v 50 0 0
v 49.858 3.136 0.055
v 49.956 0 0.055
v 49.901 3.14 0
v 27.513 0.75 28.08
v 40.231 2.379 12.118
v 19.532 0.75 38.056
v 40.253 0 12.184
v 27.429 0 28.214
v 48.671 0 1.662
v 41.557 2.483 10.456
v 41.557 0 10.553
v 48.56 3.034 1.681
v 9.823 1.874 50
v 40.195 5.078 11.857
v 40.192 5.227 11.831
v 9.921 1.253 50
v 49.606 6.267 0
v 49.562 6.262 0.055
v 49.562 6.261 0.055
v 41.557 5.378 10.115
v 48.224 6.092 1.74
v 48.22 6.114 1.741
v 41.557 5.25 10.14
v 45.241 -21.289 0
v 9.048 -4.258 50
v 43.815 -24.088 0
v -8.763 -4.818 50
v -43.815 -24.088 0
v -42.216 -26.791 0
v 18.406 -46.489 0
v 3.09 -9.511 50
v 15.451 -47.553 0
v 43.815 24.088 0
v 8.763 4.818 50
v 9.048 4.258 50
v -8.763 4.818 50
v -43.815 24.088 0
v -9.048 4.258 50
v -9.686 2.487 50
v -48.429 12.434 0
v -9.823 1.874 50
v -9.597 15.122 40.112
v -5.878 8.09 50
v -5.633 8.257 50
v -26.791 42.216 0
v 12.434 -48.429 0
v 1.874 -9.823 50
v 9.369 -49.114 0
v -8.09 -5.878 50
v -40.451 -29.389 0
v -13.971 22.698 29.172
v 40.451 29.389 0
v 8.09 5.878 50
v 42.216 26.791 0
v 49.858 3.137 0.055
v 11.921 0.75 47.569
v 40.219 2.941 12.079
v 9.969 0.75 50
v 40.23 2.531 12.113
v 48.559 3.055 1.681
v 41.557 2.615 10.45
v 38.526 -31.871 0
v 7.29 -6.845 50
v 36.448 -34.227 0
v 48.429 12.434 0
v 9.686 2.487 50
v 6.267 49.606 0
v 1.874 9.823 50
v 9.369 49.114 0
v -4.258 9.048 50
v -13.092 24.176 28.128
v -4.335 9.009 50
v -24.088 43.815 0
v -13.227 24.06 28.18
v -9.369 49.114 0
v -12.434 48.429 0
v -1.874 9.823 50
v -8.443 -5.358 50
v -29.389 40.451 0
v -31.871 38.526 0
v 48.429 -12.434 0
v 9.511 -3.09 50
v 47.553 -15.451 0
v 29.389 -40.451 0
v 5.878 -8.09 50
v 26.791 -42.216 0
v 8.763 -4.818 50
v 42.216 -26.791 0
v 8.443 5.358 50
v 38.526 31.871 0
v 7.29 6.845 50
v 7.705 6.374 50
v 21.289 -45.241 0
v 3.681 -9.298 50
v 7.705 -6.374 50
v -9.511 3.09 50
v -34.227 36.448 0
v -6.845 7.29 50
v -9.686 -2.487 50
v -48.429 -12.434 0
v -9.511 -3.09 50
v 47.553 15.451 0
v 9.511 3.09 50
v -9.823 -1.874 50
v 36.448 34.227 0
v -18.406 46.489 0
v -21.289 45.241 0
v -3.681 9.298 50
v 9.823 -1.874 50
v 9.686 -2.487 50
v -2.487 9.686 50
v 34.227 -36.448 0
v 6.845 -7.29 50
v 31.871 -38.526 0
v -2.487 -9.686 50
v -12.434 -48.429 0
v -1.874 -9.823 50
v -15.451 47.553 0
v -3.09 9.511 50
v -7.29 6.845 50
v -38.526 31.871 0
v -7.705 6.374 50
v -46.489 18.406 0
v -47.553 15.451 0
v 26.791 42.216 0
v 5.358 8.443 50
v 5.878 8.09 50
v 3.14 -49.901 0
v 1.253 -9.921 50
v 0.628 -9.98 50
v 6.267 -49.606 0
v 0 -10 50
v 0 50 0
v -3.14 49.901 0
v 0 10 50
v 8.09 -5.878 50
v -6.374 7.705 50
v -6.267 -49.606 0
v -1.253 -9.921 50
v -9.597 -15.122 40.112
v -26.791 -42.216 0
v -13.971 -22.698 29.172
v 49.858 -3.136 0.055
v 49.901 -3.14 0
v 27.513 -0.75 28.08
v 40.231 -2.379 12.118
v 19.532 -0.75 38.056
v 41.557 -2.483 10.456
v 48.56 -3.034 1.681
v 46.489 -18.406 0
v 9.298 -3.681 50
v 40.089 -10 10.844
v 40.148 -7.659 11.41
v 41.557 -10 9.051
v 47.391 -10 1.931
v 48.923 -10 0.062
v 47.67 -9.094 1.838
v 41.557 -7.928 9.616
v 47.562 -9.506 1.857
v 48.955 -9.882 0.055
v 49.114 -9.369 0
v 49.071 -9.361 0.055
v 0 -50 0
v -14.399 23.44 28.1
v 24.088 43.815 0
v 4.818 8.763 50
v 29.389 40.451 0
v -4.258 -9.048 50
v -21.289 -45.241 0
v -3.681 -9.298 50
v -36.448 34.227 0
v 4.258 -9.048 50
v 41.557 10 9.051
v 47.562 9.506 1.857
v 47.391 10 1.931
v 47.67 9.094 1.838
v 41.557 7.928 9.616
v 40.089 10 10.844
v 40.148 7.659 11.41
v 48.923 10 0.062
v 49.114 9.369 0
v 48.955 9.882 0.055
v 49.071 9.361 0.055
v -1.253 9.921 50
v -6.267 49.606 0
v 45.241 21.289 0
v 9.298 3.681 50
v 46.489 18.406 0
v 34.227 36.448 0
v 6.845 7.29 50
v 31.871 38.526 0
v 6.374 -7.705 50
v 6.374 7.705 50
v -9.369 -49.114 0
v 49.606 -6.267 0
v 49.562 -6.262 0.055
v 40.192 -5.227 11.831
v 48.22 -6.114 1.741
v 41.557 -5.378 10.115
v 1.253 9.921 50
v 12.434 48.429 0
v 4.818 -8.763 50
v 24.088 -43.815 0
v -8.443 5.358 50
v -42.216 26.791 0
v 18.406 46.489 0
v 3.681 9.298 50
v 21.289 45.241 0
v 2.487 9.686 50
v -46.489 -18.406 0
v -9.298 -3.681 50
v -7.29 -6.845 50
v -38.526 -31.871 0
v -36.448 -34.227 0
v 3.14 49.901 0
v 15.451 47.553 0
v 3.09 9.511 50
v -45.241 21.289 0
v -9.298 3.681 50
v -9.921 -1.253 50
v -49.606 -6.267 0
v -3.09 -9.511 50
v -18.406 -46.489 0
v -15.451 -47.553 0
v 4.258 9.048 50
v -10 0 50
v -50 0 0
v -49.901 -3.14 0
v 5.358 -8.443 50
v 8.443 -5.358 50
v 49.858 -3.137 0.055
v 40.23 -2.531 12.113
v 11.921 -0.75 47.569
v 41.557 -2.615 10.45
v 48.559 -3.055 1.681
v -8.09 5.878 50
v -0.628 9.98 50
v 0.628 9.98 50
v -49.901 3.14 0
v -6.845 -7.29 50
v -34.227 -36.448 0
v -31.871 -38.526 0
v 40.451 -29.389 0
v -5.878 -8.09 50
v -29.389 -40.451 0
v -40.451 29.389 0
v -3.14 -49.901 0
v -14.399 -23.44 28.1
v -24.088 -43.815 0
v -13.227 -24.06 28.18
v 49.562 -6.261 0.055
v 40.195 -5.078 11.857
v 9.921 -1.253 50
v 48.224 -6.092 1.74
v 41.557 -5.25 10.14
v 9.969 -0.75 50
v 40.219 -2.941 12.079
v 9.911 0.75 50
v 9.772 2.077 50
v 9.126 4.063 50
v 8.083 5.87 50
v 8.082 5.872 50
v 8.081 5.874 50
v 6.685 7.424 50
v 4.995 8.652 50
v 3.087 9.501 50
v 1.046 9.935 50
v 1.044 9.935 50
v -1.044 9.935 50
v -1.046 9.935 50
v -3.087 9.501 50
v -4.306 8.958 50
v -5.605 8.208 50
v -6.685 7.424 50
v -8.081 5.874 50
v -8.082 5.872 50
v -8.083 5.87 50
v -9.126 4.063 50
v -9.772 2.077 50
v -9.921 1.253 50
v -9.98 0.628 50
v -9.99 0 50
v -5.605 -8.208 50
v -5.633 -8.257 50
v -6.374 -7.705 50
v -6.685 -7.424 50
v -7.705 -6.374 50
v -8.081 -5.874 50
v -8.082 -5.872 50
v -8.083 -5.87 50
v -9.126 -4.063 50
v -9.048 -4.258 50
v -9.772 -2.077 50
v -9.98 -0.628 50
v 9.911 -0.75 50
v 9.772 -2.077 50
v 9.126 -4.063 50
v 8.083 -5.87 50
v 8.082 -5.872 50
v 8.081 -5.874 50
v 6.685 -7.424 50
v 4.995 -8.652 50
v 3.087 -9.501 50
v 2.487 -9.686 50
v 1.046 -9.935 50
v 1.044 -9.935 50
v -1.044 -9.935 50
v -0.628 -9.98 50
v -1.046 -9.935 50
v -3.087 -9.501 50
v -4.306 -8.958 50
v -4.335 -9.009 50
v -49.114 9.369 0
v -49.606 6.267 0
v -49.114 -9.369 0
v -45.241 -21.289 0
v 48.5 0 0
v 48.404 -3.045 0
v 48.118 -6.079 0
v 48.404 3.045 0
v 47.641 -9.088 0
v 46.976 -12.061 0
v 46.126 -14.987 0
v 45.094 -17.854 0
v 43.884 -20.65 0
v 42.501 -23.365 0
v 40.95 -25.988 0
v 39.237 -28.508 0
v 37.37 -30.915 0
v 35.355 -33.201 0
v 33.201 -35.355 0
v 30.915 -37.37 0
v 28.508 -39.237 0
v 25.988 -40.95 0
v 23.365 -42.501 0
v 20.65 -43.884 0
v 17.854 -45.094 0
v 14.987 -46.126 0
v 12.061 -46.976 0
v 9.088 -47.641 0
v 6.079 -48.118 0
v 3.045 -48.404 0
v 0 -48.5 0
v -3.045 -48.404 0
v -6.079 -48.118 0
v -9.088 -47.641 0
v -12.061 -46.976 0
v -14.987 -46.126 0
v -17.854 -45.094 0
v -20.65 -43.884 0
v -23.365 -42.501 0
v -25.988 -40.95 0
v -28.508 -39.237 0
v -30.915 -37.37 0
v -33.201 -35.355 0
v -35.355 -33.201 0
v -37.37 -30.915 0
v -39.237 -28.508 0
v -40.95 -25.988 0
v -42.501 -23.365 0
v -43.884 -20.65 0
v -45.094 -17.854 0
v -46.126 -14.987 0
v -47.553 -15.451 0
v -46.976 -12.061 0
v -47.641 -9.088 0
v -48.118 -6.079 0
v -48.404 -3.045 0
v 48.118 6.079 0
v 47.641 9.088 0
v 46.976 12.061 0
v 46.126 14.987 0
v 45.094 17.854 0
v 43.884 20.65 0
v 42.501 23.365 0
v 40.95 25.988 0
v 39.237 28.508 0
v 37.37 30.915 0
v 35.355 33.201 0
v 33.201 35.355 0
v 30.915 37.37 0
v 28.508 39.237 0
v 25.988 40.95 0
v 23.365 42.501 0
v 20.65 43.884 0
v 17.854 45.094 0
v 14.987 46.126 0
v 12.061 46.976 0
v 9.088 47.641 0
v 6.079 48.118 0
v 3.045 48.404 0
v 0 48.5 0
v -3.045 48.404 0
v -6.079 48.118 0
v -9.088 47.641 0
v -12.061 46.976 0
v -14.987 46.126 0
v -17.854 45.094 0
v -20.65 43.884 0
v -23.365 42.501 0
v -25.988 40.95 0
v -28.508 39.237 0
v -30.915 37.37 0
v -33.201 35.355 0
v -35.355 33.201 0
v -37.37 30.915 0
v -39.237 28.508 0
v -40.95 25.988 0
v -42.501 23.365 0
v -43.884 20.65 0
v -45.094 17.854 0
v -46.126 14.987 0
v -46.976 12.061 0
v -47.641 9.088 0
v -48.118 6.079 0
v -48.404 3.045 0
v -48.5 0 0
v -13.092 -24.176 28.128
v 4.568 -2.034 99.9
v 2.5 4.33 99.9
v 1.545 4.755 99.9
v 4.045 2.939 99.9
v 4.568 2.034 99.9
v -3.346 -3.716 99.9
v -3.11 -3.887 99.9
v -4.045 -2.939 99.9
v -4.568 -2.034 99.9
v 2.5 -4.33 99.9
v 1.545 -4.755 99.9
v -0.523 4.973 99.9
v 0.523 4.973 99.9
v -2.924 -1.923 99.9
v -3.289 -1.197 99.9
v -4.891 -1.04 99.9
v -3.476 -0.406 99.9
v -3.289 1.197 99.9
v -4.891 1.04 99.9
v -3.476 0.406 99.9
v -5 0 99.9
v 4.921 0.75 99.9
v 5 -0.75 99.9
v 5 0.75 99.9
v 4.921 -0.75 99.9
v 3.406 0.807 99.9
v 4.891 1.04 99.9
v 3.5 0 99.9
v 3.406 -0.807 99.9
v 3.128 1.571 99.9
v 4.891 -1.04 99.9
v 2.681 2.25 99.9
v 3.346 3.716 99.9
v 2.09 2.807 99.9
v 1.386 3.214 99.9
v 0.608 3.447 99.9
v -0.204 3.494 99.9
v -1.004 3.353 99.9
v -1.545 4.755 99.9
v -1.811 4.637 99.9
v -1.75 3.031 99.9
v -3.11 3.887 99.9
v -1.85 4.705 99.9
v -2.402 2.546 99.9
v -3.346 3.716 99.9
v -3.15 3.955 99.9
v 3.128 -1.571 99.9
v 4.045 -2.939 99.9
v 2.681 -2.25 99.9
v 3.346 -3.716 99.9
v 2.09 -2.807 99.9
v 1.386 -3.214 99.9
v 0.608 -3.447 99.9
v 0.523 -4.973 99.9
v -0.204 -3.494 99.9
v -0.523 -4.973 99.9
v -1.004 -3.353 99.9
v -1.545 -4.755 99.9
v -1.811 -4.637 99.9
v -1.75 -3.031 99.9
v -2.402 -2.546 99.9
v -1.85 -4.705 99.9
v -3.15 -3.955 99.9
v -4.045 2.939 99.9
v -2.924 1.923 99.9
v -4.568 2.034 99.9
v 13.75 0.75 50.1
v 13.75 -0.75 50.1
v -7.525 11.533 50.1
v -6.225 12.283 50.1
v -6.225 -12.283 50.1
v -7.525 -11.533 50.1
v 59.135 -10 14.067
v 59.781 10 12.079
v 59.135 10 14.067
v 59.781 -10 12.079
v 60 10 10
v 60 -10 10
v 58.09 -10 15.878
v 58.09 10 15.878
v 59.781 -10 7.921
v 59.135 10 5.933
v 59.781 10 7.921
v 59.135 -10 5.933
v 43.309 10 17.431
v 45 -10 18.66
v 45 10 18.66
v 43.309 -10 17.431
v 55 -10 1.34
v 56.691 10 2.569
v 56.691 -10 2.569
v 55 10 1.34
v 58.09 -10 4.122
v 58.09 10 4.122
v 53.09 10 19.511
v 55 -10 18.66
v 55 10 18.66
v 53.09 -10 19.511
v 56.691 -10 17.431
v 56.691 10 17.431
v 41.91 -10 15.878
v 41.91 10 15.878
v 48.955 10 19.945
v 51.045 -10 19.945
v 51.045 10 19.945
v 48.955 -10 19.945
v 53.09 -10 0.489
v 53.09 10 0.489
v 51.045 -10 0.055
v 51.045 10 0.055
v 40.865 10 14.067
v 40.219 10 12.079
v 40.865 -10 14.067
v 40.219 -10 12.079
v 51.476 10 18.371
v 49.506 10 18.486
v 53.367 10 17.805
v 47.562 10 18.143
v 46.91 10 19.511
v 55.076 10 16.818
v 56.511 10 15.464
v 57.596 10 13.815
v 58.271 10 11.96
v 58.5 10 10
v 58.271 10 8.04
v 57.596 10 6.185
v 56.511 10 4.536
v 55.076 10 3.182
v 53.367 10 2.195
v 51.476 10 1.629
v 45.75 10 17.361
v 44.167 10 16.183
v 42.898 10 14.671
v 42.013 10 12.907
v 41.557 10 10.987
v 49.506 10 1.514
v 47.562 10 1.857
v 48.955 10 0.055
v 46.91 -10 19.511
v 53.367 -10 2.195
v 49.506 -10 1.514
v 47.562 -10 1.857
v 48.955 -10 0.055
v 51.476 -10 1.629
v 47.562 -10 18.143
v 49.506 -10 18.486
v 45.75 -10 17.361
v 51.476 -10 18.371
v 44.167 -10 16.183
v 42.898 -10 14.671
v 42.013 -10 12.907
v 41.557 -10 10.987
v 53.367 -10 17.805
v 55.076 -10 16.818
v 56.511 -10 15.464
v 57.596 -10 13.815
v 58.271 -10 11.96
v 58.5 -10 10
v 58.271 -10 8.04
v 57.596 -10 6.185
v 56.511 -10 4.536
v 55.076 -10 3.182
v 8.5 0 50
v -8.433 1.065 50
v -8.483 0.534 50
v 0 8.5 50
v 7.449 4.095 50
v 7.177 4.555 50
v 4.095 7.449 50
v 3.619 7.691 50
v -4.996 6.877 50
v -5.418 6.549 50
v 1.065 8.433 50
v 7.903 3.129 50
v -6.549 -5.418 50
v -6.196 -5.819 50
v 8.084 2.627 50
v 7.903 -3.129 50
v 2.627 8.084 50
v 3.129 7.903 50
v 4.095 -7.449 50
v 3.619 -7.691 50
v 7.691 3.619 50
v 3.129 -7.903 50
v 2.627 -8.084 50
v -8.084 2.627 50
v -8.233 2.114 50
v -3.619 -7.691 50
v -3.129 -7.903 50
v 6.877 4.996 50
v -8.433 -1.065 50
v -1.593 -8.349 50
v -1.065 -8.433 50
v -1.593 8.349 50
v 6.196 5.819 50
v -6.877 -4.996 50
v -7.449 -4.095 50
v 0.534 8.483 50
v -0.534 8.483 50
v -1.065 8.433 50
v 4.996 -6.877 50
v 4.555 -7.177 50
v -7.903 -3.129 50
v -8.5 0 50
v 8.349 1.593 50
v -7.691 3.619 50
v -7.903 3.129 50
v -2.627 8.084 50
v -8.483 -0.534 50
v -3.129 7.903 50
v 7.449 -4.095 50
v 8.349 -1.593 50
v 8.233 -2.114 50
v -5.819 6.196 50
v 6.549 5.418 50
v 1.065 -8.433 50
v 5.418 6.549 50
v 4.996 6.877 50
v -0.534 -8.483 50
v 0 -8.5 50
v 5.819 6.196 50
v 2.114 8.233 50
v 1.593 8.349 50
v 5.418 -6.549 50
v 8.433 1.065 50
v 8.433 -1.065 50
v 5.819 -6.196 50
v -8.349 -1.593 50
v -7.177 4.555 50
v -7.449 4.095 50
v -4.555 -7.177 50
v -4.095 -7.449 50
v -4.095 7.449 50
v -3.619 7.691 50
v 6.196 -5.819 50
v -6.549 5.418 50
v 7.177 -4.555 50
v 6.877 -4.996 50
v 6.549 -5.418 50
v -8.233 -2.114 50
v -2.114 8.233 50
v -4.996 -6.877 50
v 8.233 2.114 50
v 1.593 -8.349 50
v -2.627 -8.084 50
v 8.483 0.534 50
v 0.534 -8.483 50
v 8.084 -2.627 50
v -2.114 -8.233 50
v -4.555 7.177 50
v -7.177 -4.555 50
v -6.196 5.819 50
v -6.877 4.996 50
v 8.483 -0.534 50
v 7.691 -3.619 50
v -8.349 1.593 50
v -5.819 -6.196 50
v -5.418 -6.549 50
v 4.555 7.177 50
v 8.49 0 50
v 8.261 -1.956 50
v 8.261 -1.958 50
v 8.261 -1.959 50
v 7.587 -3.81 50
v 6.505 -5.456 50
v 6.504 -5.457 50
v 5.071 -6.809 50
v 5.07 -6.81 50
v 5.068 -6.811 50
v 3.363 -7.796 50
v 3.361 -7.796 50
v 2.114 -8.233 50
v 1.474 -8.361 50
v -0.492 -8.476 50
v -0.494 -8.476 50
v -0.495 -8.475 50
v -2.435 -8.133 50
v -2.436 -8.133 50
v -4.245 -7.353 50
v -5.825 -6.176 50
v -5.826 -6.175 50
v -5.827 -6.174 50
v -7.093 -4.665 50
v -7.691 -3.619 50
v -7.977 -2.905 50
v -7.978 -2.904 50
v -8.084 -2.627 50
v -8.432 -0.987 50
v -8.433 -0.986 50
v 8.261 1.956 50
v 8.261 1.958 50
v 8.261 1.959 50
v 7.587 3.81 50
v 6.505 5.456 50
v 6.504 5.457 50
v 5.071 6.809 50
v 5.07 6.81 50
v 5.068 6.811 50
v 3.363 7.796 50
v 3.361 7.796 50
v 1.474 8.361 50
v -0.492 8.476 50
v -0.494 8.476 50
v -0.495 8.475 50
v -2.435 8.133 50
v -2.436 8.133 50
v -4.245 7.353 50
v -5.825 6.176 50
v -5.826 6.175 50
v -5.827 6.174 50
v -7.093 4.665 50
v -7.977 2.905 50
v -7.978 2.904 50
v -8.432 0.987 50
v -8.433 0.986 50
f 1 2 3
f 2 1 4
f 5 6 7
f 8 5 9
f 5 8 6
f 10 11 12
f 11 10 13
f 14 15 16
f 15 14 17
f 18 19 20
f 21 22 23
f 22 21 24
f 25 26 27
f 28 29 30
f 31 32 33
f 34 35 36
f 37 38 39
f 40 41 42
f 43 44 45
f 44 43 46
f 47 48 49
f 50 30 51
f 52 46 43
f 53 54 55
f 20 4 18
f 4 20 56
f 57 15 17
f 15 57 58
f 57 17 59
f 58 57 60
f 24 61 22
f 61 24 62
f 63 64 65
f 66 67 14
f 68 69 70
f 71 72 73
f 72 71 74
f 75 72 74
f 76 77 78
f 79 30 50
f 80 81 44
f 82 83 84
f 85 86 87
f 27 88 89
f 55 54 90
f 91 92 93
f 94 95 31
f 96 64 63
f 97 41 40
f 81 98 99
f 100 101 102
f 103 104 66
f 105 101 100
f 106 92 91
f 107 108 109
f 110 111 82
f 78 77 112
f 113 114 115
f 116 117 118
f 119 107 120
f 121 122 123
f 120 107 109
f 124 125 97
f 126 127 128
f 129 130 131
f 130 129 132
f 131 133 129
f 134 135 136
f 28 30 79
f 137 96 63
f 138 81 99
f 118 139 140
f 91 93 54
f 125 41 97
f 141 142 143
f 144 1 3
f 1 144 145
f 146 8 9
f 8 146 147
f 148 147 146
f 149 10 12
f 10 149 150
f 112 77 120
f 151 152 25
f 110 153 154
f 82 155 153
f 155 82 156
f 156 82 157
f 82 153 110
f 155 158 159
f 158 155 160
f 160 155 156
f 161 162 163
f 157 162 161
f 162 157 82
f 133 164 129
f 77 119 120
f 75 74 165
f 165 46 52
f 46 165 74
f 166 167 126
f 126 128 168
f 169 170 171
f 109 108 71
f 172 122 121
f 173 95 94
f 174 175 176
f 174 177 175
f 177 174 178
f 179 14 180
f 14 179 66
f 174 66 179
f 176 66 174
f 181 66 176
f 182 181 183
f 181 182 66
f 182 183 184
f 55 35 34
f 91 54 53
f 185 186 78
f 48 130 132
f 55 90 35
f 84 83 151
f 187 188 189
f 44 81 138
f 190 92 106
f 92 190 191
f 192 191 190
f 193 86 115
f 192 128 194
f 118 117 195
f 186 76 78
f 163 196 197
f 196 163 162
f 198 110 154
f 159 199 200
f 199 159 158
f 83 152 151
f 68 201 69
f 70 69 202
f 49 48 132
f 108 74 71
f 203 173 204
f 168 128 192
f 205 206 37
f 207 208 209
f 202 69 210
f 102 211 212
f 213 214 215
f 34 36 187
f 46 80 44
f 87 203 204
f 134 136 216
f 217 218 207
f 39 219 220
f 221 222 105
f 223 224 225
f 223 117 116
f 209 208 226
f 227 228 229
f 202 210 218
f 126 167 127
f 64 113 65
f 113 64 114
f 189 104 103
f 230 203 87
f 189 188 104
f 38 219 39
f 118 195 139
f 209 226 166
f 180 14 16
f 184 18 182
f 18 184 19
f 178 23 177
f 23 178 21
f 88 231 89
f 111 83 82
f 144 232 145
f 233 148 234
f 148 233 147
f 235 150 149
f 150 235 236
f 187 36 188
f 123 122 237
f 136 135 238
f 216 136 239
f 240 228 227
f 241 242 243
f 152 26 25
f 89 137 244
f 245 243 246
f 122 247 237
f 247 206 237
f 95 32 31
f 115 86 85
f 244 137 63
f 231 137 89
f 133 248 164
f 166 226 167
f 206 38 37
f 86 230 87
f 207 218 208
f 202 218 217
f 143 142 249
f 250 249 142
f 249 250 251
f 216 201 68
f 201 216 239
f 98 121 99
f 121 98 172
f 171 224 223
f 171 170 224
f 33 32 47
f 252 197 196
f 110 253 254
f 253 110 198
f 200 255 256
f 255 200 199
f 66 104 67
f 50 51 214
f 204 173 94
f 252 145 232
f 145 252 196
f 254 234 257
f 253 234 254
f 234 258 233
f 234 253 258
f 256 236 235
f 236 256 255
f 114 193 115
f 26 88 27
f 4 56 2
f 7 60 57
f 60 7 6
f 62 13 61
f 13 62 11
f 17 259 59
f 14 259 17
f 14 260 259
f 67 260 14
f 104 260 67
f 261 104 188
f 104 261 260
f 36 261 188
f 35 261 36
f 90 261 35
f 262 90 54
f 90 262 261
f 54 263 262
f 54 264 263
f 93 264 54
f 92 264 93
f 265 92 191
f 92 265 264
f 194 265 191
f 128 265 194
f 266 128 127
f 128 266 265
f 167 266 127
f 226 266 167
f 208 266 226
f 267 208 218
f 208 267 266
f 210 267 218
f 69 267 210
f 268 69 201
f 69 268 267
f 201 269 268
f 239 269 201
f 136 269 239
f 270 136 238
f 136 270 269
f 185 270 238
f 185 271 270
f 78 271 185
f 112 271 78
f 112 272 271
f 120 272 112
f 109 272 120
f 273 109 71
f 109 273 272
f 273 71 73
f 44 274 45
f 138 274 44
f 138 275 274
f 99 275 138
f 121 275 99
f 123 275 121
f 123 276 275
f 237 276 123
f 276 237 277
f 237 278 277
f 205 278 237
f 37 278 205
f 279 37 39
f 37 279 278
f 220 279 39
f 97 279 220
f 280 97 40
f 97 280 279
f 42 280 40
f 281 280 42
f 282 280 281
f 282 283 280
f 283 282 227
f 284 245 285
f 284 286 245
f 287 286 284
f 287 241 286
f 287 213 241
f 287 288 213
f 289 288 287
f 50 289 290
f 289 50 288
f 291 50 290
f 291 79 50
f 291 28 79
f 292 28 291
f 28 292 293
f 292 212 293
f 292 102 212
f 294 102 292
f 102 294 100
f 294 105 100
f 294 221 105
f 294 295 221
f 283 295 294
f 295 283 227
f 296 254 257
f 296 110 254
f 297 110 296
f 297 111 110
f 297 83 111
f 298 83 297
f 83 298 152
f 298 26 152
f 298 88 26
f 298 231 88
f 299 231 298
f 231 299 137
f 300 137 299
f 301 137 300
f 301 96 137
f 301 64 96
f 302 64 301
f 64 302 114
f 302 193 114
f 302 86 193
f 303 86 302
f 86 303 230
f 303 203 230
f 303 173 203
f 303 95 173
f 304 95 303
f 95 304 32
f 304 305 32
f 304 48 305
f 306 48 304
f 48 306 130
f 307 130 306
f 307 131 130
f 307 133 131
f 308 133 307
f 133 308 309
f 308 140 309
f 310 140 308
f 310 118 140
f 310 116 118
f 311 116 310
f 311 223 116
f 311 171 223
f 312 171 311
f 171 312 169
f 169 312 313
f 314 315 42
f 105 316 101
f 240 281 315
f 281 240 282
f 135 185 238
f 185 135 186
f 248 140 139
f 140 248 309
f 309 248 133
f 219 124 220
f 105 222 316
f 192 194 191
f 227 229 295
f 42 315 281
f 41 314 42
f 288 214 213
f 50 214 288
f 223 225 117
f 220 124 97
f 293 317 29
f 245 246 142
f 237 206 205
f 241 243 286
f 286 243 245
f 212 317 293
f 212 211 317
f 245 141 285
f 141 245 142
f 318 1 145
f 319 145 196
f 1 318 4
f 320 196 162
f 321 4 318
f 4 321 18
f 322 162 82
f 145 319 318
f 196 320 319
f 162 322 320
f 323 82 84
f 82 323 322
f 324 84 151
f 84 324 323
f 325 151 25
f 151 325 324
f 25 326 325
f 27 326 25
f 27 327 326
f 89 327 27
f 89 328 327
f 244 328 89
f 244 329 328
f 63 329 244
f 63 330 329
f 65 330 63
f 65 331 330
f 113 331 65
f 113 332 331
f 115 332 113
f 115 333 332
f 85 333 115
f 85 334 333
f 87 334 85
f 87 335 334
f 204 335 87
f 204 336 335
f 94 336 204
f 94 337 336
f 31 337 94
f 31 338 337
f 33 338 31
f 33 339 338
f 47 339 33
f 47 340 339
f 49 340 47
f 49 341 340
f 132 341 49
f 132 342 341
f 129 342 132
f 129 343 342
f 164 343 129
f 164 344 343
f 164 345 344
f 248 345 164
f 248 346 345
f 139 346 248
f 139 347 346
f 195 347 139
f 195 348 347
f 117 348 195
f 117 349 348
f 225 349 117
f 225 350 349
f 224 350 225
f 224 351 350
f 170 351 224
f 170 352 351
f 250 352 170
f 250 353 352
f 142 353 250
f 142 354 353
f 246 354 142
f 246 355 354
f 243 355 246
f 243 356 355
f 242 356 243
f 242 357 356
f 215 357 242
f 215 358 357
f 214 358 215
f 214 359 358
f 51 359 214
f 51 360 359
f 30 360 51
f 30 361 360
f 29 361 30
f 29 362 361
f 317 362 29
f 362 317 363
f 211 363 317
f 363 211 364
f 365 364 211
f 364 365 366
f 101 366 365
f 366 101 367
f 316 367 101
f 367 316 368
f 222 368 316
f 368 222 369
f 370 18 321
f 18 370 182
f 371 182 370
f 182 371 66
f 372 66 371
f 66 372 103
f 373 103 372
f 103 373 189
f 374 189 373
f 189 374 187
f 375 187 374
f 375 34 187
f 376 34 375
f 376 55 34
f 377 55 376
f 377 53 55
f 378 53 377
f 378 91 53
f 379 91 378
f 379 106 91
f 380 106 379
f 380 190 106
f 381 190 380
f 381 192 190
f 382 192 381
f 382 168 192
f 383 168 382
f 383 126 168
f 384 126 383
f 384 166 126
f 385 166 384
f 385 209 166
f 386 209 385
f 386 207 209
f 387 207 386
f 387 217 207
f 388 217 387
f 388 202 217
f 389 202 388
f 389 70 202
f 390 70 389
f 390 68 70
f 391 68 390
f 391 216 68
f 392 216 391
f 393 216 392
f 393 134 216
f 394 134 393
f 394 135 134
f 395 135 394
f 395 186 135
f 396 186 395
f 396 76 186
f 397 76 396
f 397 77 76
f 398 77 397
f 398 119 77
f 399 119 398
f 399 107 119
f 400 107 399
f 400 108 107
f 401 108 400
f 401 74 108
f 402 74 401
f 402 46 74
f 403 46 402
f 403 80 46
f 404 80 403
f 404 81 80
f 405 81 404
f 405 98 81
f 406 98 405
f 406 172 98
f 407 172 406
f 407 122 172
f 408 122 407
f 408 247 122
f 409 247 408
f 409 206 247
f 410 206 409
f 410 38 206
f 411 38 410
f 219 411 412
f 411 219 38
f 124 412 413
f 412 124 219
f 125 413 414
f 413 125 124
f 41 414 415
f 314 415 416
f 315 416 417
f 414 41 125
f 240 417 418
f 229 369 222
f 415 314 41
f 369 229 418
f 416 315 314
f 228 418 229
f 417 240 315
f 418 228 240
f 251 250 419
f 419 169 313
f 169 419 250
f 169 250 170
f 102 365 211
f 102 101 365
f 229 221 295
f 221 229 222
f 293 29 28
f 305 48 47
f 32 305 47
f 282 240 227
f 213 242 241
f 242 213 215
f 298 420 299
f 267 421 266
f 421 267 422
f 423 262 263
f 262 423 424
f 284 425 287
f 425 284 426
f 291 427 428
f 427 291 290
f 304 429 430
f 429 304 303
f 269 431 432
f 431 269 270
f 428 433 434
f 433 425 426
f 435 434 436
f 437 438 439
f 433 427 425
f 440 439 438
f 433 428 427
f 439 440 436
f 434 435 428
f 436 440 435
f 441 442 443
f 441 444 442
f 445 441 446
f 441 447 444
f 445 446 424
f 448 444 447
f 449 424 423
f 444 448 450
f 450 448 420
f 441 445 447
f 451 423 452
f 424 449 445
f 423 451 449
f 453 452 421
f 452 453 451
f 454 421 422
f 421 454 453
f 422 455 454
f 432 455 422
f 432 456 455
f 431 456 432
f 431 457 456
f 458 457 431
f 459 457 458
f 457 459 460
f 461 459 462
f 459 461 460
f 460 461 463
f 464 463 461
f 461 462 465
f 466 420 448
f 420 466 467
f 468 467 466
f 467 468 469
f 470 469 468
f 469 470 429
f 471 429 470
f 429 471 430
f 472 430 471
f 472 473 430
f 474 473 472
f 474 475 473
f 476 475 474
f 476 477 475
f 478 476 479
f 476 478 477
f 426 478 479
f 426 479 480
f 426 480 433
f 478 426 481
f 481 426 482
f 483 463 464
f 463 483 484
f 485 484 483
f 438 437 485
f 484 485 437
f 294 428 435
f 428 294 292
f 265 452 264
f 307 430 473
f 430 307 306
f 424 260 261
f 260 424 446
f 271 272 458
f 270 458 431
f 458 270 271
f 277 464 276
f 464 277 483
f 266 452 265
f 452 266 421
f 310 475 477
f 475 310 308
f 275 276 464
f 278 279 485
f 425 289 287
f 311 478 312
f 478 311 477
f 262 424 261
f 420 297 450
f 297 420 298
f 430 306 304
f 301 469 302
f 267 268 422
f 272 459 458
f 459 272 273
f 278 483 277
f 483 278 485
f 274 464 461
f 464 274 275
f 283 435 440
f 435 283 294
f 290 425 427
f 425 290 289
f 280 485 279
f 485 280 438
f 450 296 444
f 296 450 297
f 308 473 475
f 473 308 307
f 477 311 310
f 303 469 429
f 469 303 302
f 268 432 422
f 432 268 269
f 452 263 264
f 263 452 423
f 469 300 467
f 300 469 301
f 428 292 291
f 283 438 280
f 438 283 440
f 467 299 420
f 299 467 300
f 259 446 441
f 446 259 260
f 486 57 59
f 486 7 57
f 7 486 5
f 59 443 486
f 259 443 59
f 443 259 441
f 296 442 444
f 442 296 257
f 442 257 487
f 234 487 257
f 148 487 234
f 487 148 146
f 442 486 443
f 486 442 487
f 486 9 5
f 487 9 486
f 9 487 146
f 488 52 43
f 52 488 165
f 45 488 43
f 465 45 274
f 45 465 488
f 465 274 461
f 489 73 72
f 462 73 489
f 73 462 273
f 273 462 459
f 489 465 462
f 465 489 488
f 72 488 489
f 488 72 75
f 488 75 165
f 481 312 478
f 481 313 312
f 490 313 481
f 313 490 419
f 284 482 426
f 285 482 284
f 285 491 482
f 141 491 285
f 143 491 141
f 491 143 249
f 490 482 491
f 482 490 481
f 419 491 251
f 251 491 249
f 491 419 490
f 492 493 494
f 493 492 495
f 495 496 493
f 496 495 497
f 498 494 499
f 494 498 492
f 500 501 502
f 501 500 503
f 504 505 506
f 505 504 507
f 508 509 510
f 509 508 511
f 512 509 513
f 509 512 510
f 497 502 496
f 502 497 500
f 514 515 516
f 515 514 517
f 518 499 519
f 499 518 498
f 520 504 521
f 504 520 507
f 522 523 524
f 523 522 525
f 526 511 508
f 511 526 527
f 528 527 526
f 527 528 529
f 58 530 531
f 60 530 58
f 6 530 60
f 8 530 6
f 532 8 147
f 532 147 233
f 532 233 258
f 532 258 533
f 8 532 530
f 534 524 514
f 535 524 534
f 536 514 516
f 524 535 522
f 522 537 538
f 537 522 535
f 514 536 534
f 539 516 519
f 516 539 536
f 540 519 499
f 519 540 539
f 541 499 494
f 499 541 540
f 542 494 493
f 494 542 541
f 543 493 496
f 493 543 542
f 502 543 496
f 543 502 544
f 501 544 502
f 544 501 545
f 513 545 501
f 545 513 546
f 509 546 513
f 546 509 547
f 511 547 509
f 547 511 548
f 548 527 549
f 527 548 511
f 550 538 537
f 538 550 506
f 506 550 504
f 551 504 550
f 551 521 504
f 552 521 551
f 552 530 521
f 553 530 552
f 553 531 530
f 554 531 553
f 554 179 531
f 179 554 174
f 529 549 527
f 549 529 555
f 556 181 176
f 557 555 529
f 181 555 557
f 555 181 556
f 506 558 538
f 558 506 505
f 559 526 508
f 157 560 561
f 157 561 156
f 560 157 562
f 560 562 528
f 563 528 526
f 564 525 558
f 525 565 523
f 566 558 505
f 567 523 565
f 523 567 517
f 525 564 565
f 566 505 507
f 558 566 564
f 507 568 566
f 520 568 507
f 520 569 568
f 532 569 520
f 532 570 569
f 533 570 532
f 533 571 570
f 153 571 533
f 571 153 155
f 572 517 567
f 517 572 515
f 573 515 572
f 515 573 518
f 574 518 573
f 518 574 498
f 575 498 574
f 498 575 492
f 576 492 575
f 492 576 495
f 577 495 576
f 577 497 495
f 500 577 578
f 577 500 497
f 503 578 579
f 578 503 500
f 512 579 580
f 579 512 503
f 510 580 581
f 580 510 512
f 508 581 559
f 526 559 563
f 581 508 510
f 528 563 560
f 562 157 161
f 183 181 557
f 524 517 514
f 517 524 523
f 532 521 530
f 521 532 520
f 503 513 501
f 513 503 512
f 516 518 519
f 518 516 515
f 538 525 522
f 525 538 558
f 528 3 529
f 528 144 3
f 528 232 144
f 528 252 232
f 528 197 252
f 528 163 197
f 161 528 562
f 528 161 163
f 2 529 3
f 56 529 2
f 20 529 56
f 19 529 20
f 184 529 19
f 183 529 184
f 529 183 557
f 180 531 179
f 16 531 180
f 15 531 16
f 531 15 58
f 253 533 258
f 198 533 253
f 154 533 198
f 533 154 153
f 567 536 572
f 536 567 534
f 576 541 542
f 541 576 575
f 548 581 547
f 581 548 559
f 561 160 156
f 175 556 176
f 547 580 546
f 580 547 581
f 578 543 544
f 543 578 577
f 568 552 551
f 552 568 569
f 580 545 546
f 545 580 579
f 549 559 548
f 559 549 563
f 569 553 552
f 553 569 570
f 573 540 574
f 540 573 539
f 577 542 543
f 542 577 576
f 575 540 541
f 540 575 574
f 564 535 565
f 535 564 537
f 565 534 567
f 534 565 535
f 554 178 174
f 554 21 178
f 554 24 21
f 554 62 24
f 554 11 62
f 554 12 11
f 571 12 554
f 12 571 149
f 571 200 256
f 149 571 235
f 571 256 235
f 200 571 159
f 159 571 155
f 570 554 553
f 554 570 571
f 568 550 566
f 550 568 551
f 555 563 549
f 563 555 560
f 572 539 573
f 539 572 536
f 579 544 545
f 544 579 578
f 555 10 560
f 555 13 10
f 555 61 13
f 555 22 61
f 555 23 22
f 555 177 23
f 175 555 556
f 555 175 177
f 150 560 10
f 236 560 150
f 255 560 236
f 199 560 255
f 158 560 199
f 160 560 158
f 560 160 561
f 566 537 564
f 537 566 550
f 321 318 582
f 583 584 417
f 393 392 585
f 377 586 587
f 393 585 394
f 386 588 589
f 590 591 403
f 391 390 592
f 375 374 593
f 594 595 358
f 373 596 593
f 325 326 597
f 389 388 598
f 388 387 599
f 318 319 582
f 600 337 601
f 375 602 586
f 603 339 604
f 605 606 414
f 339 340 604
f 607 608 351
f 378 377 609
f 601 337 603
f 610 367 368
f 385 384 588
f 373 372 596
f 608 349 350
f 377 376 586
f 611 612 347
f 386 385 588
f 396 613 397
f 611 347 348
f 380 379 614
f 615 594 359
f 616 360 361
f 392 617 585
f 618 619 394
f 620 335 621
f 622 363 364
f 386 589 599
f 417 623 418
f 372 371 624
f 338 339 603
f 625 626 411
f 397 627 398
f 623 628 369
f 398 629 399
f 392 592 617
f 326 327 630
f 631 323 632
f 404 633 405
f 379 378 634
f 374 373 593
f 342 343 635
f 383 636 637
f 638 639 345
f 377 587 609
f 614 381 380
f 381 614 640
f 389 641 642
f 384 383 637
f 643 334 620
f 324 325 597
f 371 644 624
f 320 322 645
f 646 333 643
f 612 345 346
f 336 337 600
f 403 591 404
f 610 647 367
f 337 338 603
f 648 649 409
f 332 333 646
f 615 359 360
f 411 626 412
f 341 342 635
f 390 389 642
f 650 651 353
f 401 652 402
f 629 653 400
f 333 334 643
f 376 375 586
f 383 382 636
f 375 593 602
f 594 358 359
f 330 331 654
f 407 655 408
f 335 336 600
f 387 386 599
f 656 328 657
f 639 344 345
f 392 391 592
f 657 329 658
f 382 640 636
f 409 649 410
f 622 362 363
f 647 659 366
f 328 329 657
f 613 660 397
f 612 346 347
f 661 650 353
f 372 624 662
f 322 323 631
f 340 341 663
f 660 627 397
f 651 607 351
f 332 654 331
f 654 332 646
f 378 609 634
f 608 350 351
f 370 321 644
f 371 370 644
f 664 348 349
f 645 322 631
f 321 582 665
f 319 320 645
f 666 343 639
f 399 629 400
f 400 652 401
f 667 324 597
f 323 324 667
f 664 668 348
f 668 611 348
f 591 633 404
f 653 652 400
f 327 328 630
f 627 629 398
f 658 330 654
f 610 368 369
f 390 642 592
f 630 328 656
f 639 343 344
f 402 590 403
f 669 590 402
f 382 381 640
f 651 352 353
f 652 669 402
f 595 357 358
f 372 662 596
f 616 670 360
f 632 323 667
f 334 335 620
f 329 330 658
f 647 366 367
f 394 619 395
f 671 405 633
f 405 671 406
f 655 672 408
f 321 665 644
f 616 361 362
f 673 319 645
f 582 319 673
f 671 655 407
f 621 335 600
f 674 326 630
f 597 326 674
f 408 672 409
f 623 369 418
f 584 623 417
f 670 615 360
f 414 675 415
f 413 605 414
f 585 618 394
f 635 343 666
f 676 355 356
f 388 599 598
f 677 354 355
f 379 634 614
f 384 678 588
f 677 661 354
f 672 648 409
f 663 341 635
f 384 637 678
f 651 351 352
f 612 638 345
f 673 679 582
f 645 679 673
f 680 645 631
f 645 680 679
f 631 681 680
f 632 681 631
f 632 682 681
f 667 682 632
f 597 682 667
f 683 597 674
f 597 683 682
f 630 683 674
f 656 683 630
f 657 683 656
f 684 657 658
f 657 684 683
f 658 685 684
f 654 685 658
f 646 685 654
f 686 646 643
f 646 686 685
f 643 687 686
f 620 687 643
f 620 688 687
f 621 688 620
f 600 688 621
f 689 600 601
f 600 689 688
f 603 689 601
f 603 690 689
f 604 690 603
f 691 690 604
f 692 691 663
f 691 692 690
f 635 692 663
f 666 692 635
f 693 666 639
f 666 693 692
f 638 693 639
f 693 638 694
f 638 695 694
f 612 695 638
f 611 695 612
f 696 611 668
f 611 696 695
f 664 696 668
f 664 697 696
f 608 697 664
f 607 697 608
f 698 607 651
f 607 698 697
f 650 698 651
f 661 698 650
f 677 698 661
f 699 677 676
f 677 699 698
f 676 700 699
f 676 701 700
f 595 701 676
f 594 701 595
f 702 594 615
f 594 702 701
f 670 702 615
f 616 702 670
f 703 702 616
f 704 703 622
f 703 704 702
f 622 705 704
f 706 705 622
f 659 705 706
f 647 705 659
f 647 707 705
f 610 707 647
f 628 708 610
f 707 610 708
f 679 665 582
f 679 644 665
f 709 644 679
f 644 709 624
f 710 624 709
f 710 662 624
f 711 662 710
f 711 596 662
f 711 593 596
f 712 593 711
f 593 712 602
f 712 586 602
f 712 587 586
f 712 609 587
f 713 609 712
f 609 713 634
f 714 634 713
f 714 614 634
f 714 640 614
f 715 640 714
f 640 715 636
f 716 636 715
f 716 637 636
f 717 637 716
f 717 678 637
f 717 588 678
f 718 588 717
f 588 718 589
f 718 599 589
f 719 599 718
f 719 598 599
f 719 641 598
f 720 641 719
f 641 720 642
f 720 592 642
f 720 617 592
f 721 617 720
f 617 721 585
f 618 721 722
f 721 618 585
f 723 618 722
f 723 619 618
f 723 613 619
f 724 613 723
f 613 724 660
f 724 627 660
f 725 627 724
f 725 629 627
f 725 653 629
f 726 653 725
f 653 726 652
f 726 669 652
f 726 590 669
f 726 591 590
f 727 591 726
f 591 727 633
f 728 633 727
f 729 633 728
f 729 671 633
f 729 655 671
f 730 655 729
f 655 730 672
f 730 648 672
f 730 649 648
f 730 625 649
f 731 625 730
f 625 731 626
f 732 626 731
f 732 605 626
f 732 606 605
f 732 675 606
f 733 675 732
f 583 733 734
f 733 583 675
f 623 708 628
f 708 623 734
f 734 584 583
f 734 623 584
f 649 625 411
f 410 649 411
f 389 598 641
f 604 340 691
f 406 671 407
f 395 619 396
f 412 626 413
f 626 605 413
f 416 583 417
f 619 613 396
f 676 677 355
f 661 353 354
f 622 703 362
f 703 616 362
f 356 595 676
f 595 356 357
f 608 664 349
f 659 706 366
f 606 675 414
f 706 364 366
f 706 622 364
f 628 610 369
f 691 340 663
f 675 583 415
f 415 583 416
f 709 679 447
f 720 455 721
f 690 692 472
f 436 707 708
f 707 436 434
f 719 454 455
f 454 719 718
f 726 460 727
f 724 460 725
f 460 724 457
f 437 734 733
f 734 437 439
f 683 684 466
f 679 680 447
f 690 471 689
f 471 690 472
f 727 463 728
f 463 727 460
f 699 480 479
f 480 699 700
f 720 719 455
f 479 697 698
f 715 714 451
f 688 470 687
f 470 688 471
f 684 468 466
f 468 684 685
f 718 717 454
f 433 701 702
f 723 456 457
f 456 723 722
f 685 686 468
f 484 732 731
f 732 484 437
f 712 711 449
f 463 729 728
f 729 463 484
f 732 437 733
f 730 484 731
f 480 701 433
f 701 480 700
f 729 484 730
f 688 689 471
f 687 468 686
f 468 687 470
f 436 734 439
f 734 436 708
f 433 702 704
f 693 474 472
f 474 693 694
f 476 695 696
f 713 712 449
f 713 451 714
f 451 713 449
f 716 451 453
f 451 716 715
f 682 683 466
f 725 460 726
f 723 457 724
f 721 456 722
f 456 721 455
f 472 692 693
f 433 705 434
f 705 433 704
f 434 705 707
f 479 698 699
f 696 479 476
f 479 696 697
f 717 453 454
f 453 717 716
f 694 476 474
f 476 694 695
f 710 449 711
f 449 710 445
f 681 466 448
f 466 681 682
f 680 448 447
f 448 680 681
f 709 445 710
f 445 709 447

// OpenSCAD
top_diameter    = 100; // [40:1:500]
middle_diameter =  20; // [10:1:60]
bottom_diameter =  10; // [5:1:40]
top_rim         =   0; // [0:1:50]

wall = 1.5; // [0.5:0.05:4]
create_ventilation = "true"; // [true, false]
create_handle = "true"; // [true, false]

all();

module all()
{
    difference()
    {
        union()
        {
            funnel();
            if(create_ventilation == "true") ventilation();
            if(create_handle == "true") handle();
        }
        funnel(wall);
        
    }
}

module funnel(wall=0)
{
    cylinder(d=top_diameter-2*wall, h=top_rim, $fn=top_diameter);
    translate([0,0,top_rim])
        cylinder(d1=top_diameter-2*wall, d2=middle_diameter-2*wall, top_diameter/2, $fn=top_diameter);
    translate([0,0,top_diameter/2+top_rim-0.1]) 
        cylinder(d1=middle_diameter-2*wall, d2=bottom_diameter-2*wall, top_diameter/2);
}

module handle()
{
    translate([x_handle(),middle_diameter/2,middle_diameter/2]) rotate([90,0,0]) 
        difference()
        {
            cylinder(d=middle_diameter, h=middle_diameter);
            cylinder(d=middle_diameter-2*wall, h=middle_diameter);
        }
}

function x_handle() = (top_rim>5) ? top_diameter/2+middle_diameter/4 : top_diameter/2;


module ventilation()
{
    for(alpha=[0,120,240])
    {
        rotate([0,0,alpha])
        union()
        {
            hull()
            {
                // bottom of funnel
                translate([0,-wall/2,top_diameter+top_rim-0.2]) 
                    cube([bottom_diameter/2,wall,0.1]);
                // middle of funnel
                translate([0,-wall/2,top_diameter/2+top_rim]) 
                    cube([middle_diameter/2+2.5*wall,wall,0.1]);
            }
            hull()
            {
                // middle of funnel
                translate([0,-wall/2,top_diameter/2+top_rim]) 
                    cube([middle_diameter/2+2.5*wall,wall,0.1]);
                // top of funnel
                translate([0,-wall/2,top_rim]) 
                    cube([top_diameter/2*0.9,wall,0.1]);
            }
        }
    }
}
